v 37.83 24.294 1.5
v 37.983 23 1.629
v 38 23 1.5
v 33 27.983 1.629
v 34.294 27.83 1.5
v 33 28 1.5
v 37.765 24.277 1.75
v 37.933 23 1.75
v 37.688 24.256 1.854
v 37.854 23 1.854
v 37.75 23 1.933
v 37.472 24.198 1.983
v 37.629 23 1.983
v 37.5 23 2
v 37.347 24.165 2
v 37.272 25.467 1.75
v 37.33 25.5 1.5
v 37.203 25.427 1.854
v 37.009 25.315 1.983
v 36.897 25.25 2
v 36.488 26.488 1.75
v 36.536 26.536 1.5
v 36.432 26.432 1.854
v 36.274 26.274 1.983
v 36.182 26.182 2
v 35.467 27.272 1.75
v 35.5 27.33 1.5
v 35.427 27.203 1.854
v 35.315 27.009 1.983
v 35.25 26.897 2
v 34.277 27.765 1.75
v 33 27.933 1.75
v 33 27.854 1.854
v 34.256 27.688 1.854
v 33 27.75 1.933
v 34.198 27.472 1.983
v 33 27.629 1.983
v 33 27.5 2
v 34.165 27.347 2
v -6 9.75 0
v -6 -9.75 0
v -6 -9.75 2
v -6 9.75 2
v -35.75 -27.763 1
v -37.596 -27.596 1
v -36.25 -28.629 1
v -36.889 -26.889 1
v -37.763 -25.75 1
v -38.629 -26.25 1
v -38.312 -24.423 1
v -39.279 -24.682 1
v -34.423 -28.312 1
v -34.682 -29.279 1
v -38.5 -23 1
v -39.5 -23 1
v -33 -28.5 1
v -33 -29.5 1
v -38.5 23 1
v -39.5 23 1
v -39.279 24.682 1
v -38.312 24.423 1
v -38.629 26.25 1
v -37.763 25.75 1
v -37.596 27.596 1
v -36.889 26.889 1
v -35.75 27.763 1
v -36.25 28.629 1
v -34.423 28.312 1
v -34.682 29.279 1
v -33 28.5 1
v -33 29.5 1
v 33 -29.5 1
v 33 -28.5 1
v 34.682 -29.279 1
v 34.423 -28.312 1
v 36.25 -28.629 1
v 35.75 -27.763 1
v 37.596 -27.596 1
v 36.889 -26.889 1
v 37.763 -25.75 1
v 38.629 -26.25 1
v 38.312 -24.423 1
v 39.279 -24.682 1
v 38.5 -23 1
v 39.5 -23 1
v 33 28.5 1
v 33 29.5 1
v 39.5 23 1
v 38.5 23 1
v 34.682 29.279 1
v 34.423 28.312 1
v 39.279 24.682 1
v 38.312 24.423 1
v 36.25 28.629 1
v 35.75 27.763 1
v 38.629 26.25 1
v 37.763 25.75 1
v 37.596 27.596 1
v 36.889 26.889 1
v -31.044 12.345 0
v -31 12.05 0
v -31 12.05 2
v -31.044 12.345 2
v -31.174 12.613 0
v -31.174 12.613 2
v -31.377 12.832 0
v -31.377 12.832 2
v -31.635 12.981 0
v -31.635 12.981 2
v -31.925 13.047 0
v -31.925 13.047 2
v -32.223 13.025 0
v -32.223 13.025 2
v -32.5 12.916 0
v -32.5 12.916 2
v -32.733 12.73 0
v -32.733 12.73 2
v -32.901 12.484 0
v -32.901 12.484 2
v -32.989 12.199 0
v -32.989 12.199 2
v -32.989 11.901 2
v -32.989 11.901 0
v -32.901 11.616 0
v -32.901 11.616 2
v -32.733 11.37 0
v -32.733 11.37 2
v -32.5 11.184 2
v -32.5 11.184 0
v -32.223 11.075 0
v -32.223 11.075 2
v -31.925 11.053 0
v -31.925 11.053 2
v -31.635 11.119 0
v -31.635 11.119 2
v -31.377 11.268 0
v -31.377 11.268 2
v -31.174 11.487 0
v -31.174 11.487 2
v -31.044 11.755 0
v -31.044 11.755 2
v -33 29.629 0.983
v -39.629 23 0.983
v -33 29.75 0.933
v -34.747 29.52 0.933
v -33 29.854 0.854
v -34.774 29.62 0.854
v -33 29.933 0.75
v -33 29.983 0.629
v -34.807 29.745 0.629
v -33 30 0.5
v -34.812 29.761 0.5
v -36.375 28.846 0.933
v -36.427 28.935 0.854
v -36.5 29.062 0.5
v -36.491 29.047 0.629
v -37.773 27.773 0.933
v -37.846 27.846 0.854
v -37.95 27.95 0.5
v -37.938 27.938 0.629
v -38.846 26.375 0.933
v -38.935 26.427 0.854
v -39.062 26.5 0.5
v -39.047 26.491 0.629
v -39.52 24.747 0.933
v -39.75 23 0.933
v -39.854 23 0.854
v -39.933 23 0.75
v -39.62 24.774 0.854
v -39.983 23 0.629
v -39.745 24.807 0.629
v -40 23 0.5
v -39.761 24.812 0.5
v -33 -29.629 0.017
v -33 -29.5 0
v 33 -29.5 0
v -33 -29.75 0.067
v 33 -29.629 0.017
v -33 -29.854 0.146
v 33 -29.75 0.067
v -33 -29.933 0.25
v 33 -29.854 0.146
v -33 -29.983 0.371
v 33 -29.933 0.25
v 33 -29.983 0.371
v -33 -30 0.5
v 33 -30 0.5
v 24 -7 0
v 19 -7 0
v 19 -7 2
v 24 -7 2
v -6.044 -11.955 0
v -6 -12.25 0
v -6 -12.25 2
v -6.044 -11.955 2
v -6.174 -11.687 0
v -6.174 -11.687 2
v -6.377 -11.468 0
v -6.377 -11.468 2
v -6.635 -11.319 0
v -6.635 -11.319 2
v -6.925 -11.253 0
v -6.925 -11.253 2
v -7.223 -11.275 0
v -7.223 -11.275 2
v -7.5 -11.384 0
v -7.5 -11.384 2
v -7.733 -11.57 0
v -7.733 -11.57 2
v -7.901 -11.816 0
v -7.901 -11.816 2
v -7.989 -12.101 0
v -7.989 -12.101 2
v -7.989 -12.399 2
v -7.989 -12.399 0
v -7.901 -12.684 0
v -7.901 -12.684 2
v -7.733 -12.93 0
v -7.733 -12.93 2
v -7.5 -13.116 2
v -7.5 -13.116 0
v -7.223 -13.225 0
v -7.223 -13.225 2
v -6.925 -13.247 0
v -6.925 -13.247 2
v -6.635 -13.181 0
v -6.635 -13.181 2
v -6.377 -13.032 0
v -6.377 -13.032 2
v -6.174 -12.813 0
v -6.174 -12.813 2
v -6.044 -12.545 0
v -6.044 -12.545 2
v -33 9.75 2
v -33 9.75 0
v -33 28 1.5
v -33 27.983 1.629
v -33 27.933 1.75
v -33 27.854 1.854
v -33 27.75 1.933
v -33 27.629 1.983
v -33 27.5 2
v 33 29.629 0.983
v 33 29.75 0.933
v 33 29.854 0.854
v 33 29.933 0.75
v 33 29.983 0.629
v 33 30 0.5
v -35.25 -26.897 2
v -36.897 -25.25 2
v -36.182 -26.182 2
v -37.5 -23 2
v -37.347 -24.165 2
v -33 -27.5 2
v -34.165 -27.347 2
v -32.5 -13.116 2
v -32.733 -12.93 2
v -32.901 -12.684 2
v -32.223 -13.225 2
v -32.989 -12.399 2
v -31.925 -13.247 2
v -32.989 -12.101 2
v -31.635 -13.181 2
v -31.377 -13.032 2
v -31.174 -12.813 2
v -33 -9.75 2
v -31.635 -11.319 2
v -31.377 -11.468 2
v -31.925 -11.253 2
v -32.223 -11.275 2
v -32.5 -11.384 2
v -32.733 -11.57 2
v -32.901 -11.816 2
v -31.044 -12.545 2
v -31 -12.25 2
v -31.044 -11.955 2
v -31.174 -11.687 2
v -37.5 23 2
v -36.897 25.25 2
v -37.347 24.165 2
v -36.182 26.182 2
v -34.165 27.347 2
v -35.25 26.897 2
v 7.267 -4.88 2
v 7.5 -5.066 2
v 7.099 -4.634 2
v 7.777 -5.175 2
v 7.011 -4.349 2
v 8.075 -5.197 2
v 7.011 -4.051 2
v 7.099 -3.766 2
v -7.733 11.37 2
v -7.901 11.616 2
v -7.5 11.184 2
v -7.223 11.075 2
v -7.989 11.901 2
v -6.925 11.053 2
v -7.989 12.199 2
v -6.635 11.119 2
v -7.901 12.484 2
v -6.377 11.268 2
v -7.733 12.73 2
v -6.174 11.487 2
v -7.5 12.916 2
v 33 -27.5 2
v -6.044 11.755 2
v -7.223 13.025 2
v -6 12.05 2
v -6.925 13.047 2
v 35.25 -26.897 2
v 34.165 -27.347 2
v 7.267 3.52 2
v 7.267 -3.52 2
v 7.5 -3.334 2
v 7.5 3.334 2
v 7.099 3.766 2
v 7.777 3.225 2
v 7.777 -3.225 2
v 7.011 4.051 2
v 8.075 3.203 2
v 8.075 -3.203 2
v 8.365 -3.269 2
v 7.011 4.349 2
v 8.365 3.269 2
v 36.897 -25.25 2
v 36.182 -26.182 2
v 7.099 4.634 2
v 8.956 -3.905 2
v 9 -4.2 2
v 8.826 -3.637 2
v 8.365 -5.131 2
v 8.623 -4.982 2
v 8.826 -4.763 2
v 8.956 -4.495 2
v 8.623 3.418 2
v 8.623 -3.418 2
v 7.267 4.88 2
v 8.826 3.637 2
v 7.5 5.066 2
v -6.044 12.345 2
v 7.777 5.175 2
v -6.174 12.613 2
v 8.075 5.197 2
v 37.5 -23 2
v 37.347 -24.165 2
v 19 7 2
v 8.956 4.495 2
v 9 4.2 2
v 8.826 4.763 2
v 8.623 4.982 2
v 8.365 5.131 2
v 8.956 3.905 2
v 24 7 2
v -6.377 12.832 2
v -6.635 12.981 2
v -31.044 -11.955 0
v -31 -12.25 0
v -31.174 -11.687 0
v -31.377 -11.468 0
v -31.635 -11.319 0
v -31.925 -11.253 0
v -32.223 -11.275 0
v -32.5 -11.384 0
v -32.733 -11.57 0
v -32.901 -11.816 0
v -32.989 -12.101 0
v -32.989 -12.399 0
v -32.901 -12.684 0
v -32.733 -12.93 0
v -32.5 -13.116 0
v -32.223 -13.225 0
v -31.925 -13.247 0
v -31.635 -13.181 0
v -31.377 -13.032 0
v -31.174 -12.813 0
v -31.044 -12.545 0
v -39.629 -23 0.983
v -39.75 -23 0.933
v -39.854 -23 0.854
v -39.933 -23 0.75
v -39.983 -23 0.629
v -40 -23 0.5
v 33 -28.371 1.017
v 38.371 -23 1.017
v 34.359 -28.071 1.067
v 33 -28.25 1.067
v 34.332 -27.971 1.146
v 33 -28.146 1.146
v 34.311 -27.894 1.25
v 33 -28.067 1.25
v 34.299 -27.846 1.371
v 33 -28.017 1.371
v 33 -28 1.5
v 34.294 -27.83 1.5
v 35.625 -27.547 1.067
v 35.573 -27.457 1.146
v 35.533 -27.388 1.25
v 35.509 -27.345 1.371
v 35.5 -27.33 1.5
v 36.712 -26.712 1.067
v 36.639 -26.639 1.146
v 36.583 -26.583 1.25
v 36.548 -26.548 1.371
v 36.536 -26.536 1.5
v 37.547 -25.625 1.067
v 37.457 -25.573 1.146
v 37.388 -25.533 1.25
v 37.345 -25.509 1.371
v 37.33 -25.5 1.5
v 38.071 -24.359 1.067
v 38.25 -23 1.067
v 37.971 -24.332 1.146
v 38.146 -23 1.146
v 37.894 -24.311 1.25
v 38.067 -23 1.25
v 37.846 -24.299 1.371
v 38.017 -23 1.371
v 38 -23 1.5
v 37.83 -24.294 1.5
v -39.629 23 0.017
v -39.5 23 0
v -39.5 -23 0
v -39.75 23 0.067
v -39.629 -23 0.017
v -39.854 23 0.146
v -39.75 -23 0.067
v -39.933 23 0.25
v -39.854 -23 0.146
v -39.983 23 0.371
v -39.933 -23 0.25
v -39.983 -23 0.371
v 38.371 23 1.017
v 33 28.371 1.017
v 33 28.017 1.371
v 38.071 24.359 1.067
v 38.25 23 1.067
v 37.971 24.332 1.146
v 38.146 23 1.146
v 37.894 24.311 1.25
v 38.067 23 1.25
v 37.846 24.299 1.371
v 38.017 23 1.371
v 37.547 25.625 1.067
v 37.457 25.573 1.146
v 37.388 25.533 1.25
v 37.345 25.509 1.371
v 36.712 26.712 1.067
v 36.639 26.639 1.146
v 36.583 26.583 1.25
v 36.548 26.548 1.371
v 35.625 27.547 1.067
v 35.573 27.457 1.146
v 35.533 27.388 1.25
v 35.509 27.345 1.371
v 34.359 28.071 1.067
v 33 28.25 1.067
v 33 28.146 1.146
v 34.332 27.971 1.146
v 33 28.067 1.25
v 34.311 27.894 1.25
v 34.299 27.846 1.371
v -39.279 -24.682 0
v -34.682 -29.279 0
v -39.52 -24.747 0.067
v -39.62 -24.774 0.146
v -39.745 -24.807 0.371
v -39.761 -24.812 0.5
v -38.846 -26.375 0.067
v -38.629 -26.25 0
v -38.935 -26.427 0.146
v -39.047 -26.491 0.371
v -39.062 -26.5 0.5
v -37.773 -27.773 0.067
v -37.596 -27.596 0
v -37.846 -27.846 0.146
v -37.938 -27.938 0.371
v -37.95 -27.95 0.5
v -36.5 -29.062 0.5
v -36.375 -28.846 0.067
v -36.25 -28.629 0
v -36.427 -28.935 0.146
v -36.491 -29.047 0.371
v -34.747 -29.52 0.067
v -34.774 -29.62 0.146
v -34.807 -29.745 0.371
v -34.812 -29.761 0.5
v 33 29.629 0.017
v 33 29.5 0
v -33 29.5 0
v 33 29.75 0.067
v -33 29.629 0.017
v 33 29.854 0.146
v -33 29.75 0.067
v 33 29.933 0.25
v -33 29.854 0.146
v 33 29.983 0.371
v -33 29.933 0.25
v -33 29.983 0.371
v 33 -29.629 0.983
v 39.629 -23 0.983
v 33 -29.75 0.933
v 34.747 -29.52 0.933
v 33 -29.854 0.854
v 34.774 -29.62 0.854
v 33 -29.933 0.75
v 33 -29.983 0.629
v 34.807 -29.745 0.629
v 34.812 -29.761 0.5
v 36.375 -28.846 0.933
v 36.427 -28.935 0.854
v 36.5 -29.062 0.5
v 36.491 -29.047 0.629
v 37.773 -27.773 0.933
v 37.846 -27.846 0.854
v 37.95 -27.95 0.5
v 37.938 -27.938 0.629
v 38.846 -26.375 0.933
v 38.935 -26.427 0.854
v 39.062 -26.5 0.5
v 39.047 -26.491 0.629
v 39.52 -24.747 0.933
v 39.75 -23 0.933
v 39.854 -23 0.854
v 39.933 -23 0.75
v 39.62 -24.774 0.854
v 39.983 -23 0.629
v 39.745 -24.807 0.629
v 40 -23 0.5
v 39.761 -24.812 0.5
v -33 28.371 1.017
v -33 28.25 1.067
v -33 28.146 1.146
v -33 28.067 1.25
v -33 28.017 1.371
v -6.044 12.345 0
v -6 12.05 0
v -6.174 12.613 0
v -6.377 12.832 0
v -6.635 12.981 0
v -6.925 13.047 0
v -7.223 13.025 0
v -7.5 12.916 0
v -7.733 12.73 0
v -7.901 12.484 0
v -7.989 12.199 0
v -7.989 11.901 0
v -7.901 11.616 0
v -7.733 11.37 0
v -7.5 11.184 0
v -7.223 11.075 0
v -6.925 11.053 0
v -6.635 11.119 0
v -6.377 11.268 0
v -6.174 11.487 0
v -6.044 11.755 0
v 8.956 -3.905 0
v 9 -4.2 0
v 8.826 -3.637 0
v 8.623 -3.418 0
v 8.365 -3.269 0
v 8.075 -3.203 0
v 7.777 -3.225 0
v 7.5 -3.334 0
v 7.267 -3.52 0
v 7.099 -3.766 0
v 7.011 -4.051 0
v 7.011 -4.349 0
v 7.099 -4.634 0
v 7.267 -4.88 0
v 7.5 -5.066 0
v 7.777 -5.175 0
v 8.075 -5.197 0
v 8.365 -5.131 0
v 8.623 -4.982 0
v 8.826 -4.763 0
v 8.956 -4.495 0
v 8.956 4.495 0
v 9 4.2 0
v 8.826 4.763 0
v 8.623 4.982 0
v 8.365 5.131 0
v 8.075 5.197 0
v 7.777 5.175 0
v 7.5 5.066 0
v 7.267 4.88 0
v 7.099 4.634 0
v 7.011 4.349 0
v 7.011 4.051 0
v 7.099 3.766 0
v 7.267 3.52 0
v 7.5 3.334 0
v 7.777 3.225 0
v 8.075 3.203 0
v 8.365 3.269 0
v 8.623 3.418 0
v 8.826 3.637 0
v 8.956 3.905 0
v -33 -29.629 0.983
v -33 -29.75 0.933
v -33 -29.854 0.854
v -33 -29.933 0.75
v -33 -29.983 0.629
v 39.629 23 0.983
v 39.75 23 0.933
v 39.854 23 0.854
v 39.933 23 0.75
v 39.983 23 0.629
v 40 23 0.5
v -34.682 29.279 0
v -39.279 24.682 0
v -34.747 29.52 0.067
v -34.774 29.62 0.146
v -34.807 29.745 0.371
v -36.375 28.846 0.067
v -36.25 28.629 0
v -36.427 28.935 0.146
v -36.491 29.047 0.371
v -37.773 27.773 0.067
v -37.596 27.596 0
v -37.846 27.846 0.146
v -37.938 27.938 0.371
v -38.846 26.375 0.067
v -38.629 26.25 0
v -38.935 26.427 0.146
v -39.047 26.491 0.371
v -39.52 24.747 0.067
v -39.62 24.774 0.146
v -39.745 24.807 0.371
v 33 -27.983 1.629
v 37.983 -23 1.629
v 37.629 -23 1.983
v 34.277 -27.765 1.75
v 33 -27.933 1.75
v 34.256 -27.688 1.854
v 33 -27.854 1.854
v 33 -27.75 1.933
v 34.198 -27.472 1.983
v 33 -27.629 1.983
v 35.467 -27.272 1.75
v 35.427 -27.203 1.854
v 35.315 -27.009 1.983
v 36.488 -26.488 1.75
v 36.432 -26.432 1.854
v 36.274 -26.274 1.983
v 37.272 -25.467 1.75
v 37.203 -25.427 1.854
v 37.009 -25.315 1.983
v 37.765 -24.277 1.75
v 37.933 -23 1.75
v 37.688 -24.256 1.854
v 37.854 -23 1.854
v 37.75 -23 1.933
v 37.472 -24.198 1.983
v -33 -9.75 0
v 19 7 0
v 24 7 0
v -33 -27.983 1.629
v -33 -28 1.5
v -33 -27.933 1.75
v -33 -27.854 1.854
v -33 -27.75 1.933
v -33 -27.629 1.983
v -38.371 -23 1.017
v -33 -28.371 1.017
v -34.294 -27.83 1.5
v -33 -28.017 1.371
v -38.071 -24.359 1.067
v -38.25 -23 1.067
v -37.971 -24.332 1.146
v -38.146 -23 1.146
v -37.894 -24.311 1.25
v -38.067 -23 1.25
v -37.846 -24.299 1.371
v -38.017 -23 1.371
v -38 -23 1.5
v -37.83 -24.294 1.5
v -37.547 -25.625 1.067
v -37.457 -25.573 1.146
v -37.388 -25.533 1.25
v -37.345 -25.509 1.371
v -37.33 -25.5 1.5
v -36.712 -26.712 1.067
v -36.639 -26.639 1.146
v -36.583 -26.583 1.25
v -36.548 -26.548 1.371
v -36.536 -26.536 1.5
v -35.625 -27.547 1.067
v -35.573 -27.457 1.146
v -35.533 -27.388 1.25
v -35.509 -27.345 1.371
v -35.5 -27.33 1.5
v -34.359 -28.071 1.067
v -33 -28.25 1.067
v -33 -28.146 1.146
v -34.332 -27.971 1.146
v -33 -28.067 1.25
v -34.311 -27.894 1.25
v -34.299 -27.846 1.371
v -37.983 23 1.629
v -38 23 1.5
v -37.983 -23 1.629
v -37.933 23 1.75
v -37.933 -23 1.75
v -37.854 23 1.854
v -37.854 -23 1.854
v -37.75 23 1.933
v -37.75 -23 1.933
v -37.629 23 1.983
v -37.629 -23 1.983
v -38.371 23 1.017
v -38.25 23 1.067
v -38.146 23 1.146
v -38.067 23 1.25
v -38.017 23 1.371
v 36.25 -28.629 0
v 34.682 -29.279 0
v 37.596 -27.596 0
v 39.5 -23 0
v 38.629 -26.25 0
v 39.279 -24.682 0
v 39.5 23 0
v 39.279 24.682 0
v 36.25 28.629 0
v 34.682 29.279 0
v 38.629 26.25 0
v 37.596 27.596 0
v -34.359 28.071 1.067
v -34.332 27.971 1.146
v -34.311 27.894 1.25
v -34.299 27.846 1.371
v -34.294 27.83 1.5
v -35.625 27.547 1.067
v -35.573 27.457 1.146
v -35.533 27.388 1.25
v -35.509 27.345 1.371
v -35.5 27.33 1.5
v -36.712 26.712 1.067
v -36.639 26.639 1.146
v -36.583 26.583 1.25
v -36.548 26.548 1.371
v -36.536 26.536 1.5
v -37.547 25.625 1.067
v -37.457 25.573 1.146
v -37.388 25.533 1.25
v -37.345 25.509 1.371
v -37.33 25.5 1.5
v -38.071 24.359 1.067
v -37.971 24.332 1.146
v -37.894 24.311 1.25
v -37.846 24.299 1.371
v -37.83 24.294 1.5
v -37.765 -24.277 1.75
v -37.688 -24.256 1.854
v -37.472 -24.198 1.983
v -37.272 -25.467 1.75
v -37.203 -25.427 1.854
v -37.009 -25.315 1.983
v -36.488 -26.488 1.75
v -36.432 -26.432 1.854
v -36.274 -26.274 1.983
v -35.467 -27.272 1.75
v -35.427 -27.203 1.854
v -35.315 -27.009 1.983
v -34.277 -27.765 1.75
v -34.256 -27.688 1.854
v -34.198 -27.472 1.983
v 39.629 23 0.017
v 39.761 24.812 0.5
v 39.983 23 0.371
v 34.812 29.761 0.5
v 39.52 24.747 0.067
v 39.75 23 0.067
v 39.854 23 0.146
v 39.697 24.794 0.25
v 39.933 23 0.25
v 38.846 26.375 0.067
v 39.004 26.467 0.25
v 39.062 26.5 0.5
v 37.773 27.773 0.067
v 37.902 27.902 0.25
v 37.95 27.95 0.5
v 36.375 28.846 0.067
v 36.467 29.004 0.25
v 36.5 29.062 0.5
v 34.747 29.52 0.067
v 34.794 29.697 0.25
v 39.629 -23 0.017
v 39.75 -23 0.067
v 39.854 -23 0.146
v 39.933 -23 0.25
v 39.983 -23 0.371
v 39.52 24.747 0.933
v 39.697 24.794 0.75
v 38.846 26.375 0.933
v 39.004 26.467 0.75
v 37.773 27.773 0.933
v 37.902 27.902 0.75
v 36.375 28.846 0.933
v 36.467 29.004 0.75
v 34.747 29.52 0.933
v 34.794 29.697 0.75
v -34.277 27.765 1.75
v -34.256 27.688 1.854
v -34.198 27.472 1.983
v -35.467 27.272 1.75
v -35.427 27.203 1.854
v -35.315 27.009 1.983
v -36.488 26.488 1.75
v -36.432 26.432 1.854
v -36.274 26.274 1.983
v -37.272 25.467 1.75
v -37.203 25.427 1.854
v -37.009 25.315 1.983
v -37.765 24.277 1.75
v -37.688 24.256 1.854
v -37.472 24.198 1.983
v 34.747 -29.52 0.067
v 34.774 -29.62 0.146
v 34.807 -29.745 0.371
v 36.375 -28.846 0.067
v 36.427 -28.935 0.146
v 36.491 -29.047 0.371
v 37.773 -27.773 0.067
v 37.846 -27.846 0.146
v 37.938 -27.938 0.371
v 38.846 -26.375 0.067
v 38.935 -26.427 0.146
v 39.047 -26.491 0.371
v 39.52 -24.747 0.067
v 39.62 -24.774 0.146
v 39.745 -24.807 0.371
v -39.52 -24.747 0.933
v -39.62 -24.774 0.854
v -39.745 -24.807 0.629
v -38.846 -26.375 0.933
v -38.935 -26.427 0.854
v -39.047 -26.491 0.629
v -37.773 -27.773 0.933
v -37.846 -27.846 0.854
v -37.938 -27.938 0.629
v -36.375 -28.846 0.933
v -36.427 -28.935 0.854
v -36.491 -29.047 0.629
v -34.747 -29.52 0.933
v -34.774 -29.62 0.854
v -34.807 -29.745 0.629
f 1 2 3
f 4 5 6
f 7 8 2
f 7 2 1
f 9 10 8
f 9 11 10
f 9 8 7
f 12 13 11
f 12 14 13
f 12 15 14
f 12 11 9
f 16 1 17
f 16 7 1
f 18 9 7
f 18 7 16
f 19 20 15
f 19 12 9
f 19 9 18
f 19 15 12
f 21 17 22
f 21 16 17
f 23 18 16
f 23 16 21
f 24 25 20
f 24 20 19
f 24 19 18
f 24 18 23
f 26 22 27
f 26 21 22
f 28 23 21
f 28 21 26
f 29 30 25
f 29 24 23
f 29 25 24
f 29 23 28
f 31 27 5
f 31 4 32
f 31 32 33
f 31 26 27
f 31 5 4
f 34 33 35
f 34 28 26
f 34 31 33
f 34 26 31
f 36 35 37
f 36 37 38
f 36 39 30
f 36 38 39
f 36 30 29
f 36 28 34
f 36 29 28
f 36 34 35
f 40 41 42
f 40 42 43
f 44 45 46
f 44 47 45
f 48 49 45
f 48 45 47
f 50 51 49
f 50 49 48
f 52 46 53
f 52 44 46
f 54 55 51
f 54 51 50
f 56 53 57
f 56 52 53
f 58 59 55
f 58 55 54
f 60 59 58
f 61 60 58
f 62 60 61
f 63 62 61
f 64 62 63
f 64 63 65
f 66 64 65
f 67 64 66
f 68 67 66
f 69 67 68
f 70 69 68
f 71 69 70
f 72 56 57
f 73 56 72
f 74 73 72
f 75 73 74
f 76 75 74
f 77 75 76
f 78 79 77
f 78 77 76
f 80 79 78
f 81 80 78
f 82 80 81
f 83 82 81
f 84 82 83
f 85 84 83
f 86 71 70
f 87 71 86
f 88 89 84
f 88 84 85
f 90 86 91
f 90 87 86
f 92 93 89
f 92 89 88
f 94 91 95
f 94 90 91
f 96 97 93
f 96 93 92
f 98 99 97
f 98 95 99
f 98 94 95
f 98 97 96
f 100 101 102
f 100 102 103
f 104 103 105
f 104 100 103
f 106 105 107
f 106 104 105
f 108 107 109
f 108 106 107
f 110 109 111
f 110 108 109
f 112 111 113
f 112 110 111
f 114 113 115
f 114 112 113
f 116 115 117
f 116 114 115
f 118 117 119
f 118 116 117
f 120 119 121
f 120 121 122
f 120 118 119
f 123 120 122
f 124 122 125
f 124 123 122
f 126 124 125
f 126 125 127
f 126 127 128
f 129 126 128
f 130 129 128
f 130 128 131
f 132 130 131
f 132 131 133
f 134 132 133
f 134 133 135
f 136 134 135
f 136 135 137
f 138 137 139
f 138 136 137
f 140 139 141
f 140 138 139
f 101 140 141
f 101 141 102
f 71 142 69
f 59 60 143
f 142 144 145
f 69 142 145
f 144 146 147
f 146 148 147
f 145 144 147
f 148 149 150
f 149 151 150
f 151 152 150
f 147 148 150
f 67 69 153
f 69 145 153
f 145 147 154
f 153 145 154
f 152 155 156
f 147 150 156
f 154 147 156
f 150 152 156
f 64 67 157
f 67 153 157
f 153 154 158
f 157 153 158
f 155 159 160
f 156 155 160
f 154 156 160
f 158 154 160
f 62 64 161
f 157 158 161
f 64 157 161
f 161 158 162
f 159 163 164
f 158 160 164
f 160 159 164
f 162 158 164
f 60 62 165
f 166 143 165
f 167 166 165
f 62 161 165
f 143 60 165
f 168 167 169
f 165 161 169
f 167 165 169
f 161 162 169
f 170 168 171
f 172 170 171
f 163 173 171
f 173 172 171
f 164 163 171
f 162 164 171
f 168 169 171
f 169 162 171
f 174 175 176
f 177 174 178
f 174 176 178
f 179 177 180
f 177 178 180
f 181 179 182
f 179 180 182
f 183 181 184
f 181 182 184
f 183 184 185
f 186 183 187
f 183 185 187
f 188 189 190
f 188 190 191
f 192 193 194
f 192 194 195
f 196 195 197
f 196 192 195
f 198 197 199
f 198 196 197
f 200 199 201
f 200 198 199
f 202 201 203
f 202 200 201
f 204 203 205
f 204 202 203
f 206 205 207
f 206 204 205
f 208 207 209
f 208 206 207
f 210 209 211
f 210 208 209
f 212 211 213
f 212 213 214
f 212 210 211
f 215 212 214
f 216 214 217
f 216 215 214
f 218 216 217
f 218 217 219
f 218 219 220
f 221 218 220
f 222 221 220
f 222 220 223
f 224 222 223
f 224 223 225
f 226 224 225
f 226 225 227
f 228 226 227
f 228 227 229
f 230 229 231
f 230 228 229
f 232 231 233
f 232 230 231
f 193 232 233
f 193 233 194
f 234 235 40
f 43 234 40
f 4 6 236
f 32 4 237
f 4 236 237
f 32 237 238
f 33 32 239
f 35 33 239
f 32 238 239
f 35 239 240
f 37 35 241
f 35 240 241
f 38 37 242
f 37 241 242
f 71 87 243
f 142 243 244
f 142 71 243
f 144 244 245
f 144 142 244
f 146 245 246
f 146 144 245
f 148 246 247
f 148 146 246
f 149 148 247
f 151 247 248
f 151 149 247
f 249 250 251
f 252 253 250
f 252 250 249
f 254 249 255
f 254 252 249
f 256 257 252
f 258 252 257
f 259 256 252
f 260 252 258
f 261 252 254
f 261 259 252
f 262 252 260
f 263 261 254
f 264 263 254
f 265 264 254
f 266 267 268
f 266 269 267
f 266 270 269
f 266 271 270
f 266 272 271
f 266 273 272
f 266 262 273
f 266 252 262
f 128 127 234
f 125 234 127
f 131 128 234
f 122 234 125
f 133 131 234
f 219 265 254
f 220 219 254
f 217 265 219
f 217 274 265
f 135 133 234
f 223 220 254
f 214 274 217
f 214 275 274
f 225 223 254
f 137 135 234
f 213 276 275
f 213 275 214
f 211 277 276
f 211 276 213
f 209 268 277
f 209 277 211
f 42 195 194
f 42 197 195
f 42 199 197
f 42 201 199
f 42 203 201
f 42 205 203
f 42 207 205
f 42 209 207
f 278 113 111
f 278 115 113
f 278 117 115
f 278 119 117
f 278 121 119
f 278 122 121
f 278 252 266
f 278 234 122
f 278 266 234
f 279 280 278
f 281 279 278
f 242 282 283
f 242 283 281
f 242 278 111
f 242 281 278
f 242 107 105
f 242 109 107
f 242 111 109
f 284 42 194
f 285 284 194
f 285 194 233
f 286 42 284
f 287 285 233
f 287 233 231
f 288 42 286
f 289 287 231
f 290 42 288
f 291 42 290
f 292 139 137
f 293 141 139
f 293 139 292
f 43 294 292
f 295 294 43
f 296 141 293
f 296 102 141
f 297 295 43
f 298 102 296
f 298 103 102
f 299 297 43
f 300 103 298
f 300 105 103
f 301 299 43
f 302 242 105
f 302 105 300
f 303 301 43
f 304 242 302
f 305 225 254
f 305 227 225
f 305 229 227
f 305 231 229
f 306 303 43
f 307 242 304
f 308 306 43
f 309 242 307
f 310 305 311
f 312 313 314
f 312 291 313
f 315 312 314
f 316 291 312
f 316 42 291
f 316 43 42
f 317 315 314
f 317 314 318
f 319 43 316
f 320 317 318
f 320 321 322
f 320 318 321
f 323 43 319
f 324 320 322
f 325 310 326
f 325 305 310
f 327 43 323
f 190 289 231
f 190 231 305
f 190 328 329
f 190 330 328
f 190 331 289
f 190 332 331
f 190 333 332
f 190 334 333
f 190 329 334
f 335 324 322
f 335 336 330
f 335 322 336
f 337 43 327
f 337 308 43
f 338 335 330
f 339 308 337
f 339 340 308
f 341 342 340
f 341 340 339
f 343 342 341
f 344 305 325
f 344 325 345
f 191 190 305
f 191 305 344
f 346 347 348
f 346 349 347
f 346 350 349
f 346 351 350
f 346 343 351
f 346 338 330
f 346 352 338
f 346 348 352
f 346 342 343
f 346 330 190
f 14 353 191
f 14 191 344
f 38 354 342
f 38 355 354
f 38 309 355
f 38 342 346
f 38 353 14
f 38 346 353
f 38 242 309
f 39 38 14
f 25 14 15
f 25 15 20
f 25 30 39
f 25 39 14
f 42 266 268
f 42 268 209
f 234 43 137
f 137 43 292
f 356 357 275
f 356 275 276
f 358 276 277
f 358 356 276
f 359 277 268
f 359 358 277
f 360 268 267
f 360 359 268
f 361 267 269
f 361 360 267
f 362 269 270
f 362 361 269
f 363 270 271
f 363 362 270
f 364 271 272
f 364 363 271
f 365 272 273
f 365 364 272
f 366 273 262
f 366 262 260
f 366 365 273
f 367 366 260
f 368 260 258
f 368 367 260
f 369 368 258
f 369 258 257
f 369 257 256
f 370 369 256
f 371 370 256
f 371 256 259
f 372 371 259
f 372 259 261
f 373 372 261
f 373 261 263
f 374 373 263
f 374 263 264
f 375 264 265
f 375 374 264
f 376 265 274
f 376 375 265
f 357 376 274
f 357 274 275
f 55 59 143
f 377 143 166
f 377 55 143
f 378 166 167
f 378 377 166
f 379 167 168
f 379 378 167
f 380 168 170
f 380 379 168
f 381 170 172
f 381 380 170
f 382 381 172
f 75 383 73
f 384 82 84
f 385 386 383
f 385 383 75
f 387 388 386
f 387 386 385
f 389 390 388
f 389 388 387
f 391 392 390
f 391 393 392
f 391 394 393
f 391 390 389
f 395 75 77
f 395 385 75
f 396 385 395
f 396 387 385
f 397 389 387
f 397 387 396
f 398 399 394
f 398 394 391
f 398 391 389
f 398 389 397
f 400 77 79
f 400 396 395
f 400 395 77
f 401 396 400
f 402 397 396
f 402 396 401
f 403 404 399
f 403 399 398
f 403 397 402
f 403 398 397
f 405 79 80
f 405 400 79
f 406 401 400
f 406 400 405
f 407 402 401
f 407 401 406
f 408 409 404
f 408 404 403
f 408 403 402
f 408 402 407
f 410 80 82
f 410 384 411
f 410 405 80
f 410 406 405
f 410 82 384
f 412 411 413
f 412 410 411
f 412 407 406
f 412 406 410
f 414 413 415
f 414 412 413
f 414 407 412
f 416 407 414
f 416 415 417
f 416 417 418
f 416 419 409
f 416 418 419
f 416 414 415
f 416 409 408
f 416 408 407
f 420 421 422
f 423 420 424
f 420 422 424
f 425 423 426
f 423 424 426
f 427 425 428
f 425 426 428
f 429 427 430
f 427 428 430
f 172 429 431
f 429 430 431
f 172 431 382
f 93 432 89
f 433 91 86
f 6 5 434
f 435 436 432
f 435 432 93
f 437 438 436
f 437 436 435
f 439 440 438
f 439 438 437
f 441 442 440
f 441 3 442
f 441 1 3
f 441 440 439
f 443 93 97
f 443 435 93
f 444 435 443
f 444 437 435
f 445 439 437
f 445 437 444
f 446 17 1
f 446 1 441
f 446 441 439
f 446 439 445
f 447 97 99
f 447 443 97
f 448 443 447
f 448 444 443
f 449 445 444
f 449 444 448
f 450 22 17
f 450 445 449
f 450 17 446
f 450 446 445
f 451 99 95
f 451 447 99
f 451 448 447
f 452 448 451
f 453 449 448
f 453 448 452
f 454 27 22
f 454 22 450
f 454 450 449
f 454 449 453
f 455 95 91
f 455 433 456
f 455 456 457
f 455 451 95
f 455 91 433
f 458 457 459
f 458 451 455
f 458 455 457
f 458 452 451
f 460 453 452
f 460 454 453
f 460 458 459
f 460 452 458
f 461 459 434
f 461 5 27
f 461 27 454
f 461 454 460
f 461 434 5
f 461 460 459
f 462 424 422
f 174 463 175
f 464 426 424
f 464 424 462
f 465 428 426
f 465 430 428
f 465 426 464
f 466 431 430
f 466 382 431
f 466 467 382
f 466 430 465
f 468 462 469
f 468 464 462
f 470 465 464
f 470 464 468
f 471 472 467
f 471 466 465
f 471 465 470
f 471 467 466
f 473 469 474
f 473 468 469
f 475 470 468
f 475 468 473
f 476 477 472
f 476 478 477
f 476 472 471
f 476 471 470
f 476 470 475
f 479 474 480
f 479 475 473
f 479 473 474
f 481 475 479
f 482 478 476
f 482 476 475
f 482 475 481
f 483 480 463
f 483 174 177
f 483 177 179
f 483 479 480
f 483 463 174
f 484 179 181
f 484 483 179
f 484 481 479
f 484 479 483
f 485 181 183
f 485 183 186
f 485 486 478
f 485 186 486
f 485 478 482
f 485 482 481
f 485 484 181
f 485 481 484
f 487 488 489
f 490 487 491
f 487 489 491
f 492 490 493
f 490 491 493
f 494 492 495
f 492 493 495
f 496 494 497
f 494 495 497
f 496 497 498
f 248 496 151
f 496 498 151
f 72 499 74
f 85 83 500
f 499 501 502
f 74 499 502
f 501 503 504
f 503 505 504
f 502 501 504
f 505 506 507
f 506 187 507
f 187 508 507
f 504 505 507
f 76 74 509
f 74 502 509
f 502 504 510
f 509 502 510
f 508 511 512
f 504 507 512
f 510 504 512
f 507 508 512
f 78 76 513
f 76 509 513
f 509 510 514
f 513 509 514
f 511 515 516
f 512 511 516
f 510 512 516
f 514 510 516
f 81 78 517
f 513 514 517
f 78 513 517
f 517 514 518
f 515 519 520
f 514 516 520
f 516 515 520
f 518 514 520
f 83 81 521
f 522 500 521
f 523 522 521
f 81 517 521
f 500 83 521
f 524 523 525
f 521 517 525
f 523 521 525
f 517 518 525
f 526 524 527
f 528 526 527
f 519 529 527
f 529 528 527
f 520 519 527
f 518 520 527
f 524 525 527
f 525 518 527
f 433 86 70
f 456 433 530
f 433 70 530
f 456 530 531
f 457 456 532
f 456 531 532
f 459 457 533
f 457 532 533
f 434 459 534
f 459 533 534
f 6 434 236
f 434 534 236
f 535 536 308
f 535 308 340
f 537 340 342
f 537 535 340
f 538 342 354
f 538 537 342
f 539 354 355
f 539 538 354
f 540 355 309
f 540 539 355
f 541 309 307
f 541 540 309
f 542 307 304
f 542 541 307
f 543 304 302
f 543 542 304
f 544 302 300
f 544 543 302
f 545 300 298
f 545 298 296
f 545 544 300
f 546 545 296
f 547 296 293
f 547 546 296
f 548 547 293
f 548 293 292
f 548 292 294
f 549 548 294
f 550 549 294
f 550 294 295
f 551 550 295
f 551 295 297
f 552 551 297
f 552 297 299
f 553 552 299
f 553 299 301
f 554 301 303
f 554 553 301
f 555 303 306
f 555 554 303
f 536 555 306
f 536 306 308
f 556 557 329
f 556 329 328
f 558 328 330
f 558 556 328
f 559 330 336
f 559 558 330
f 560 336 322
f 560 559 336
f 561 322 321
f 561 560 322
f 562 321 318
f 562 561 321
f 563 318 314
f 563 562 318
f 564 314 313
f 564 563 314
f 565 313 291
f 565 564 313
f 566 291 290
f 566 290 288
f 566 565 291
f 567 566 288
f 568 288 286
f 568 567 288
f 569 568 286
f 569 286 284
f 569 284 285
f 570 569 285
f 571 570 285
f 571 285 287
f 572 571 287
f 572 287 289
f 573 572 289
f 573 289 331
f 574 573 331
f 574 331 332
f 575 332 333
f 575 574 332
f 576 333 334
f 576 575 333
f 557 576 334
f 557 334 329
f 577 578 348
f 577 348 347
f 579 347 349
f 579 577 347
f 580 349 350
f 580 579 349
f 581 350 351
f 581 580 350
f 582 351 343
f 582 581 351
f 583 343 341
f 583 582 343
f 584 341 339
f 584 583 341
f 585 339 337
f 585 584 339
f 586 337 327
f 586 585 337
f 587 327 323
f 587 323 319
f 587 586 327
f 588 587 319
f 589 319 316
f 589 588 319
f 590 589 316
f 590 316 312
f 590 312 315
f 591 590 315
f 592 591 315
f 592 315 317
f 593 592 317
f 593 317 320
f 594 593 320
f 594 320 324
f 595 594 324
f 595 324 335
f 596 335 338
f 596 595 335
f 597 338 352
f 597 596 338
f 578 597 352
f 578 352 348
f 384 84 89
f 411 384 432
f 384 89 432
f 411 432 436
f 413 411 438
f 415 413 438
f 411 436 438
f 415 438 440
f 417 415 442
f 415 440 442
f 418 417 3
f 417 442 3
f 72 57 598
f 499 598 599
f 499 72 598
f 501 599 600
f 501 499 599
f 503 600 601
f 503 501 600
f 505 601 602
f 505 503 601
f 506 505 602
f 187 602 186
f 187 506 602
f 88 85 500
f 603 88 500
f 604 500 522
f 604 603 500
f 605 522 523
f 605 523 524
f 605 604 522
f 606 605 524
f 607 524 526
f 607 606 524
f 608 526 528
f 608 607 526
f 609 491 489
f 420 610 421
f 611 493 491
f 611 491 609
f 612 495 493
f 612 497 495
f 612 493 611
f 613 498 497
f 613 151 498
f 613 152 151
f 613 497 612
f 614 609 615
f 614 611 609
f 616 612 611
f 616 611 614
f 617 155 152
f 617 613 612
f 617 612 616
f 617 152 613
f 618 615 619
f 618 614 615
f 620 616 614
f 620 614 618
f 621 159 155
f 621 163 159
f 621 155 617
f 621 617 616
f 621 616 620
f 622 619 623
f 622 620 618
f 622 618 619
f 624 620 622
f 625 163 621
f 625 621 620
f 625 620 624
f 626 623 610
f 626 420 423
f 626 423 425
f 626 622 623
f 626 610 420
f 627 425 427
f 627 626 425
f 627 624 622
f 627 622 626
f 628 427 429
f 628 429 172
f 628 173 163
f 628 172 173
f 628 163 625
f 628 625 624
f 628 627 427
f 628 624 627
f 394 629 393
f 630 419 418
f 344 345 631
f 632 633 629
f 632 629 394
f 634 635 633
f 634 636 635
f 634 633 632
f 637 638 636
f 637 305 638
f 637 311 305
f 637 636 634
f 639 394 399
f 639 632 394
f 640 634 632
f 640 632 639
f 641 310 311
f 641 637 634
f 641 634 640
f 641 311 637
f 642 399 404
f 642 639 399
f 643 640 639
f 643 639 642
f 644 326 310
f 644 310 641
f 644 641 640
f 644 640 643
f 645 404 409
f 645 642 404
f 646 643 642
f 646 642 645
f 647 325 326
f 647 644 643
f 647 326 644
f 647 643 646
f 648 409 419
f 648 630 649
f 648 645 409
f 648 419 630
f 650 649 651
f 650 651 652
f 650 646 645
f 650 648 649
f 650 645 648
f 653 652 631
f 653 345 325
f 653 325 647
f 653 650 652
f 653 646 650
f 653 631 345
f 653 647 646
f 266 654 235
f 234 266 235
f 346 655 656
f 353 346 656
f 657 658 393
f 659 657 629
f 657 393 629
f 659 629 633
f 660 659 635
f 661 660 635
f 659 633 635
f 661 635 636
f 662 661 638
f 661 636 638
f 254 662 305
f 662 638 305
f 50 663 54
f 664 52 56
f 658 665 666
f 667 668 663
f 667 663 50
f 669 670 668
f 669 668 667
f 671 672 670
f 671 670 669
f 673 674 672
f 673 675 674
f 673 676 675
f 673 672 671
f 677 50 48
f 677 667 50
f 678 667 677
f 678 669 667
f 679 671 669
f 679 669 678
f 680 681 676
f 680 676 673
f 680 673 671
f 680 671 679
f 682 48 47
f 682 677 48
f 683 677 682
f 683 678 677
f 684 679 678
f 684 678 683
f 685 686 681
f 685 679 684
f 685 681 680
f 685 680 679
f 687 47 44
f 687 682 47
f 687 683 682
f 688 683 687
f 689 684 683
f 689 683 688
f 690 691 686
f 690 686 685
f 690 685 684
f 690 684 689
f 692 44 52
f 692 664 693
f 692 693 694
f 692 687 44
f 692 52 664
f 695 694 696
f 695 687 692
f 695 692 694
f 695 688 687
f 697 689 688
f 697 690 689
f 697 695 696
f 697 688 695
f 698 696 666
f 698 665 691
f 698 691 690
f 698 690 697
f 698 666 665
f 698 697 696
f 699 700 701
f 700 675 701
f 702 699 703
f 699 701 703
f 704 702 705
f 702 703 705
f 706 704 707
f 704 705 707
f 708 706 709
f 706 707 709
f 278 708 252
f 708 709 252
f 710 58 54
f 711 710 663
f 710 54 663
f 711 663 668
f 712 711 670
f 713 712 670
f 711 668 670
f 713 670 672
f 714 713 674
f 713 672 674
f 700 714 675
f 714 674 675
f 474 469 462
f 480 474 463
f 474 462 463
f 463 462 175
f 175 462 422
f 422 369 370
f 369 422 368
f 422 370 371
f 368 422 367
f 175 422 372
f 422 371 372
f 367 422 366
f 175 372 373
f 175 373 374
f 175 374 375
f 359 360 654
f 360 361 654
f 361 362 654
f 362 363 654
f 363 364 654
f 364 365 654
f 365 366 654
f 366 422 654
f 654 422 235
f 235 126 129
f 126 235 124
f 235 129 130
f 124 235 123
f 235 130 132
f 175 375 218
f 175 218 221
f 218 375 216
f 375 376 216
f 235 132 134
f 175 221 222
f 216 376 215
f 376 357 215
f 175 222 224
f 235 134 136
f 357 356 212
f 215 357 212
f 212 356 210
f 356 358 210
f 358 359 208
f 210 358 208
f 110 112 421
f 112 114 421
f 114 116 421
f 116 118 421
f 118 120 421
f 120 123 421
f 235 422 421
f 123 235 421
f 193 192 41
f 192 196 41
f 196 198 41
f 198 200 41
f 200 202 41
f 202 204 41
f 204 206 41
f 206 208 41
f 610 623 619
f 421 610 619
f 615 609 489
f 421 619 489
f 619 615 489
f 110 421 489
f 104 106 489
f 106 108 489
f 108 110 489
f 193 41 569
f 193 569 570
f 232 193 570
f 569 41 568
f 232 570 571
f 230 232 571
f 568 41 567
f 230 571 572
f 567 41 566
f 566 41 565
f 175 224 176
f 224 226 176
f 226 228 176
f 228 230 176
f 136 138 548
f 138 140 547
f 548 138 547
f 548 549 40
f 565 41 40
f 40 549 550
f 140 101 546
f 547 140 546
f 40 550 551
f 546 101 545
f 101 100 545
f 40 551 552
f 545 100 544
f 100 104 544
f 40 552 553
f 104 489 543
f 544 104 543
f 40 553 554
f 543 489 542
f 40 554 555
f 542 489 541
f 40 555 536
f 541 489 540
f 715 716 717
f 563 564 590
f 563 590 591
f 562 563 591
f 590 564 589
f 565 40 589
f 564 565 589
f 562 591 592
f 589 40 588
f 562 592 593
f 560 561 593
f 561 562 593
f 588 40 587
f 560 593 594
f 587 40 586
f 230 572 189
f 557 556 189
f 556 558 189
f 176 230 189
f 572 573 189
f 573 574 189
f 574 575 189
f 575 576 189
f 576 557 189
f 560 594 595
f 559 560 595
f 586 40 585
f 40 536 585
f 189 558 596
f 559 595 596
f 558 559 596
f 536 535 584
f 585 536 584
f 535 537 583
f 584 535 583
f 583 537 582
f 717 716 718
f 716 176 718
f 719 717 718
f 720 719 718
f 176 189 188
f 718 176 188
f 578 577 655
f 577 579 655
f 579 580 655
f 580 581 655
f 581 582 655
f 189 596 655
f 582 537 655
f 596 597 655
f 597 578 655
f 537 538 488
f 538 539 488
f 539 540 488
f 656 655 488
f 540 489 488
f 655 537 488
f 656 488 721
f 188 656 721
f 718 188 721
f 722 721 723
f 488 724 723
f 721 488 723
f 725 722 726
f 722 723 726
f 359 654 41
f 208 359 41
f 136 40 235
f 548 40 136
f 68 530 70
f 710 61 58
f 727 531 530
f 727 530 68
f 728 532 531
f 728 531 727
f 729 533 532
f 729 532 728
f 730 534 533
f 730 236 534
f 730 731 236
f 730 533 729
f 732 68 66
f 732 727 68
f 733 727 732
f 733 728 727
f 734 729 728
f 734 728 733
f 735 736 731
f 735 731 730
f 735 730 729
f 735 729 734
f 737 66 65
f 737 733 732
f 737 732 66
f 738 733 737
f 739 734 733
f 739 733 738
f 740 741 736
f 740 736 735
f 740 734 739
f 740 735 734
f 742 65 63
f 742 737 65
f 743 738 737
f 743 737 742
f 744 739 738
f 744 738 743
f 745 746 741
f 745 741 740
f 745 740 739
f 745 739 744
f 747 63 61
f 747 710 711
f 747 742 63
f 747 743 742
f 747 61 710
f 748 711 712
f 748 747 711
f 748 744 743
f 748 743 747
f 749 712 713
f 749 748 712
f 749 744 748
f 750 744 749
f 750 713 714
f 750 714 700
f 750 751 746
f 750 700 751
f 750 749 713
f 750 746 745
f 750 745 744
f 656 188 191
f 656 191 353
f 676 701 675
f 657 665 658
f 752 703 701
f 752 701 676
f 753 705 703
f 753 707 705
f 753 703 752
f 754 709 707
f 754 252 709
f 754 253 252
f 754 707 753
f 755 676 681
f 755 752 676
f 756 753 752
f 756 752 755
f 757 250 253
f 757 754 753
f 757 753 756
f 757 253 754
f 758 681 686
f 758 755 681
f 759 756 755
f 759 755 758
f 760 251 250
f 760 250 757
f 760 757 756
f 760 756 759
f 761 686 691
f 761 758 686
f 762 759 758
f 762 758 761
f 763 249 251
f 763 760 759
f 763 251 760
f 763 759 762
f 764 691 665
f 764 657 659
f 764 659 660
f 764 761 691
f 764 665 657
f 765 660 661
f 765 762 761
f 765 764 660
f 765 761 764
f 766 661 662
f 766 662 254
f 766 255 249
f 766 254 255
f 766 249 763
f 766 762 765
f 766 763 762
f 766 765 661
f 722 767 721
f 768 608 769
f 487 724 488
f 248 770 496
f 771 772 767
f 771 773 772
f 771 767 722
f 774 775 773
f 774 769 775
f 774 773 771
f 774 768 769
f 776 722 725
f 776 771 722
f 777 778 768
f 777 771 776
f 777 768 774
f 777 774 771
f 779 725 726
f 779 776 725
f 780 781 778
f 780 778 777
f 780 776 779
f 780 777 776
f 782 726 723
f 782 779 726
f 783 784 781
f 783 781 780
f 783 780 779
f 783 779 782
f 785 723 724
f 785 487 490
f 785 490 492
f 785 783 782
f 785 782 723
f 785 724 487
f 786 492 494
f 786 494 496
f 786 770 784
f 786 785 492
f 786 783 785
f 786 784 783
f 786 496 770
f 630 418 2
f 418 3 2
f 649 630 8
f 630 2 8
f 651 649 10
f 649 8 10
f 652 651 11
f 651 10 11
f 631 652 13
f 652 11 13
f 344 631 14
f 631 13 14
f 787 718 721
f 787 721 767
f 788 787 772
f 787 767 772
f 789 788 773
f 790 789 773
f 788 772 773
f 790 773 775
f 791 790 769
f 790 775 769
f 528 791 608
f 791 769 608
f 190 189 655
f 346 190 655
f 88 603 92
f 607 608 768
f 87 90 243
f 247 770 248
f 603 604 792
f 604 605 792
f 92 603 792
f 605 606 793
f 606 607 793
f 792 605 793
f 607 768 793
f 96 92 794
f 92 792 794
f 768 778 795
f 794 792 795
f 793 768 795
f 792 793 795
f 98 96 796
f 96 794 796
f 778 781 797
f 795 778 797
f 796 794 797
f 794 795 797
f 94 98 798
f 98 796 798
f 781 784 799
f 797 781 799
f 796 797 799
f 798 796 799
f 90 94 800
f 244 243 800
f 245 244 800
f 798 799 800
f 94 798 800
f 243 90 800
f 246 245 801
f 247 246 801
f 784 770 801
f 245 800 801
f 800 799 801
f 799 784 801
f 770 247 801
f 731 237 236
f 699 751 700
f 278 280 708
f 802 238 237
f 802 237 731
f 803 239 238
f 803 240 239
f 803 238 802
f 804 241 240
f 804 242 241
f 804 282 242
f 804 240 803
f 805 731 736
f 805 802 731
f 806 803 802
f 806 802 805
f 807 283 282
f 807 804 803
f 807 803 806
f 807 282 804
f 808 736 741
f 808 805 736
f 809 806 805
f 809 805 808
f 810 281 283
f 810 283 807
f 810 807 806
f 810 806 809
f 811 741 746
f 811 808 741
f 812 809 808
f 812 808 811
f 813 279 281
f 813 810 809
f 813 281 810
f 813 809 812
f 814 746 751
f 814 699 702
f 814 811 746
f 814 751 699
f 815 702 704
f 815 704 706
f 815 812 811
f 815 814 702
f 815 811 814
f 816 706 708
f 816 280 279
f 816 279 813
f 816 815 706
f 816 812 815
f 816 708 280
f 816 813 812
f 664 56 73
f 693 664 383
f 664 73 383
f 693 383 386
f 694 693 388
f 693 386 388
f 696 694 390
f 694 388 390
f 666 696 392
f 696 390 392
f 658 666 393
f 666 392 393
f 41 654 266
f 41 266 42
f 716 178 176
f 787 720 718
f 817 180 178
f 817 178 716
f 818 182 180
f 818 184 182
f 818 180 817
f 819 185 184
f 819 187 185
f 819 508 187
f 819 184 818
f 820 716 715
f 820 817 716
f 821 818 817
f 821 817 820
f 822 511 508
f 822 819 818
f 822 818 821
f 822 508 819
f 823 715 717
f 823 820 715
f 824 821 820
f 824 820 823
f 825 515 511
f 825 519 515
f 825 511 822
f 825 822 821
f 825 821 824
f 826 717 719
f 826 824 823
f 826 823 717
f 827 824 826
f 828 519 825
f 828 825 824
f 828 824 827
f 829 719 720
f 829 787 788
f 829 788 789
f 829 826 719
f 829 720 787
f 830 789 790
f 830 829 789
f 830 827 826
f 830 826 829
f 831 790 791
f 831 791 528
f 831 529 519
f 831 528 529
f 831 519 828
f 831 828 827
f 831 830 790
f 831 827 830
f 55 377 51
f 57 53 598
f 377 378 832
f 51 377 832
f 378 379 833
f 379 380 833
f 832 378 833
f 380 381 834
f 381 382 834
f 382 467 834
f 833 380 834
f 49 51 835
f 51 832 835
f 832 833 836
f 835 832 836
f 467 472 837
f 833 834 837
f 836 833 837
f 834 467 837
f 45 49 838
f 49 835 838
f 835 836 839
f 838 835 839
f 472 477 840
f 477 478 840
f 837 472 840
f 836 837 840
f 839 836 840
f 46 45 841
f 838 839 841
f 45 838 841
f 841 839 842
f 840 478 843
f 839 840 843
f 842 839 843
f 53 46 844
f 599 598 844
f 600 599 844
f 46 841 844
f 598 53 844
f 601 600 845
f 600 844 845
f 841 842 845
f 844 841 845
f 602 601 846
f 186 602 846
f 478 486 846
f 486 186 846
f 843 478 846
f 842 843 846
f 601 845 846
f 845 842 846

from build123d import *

# Parameters (mm, degrees)
ESQUISSE1_R             = 1
ESQUISSE1_W             = 27
ESQUISSE1_H             = 19.5
ESQUISSE1_W_2           = 5
ESQUISSE1_H_2           = 14
BOSS_EXTRU_1_DEPTH      = 2
ENL_V_START             = -1
ENL_V_MAT_EXTRU_1_DEPTH = 1
CONG_1_R                = 0.5


with BuildPart() as part:
    # Esquisse1 → Boss.-Extru.1 (new body)
    with BuildSketch(Plane.XY):
        with BuildLine():
            Line((33, 30), (-33, 30))
            ThreePointArc((-33, 30), (-37.949747468, 27.949747468), (-40, 23))
            Line((-40, 23), (-40, -23))
            ThreePointArc((-40, -23), (-37.949747468, -27.949747468), (-33, -30))
            Line((-33, -30), (33, -30))
            ThreePointArc((33, -30), (37.949747468, -27.949747468), (40, -23))
            Line((40, -23), (40, 23))
            ThreePointArc((40, 23), (37.949747468, 27.949747468), (33, 30))
        make_face()
        with Locations((-32, 12.05)):
            Circle(ESQUISSE1_R, mode=Mode.SUBTRACT)
        with Locations((-7, 12.05)):
            Circle(ESQUISSE1_R, mode=Mode.SUBTRACT)
        with Locations((-7, -12.25)):
            Circle(ESQUISSE1_R, mode=Mode.SUBTRACT)
        with Locations((-32, -12.25)):
            Circle(ESQUISSE1_R, mode=Mode.SUBTRACT)
        with Locations((8, 4.2)):
            Circle(ESQUISSE1_R, mode=Mode.SUBTRACT)
        with Locations((8, -4.2)):
            Circle(ESQUISSE1_R, mode=Mode.SUBTRACT)
        with Locations((-19.5, 0)):
            Rectangle(ESQUISSE1_W, ESQUISSE1_H, mode=Mode.SUBTRACT)
        with Locations((21.5, 0)):
            Rectangle(ESQUISSE1_W_2, ESQUISSE1_H_2, mode=Mode.SUBTRACT)
    extrude(amount=BOSS_EXTRU_1_DEPTH)

    # Esquisse2 → Enlèv. mat.-Extru.1 (cut)
    with BuildSketch(Plane.XY.offset(2).offset(ENL_V_START)):
        with BuildLine():
            Line((40, -23), (40, 23))
            ThreePointArc((40, 23), (37.949747468, 27.949747468), (33, 30))
            Line((33, 30), (-33, 30))
            ThreePointArc((-33, 30), (-37.949747468, 27.949747468), (-40, 23))
            Line((-40, 23), (-40, -23))
            ThreePointArc((-40, -23), (-37.949747468, -27.949747468), (-33, -30))
            Line((-33, -30), (33, -30))
            ThreePointArc((33, -30), (37.949747468, -27.949747468), (40, -23))
        make_face()
        with BuildLine():
            Line((38, -23), (38, 23))
            ThreePointArc((38, 23), (36.535533906, 26.535533906), (33, 28))
            Line((33, 28), (-33, 28))
            ThreePointArc((-33, 28), (-36.535533906, 26.535533906), (-38, 23))
            Line((-38, 23), (-38, -23))
            ThreePointArc((-38, -23), (-36.535533906, -26.535533906), (-33, -28))
            Line((-33, -28), (33, -28))
            ThreePointArc((33, -28), (36.535533906, -26.535533906), (38, -23))
        make_face(mode=Mode.SUBTRACT)
    extrude(amount=ENL_V_MAT_EXTRU_1_DEPTH, mode=Mode.SUBTRACT)

    # Congé1
    cong_1_edges = [part.edges().sort_by_distance(p)[0] for p in [
        (37.949747468, 27.949747468, 0),
        (40, 0, 0),
        (37.949747468, -27.949747468, 0),
        (0, -30, 0),
        (-37.949747468, -27.949747468, 0),
        (-40, 0, 0),
        (-37.949747468, 27.949747468, 0),
        (37.949747468, 27.949747468, 1),
        (40, 0, 1),
        (37.949747468, -27.949747468, 1),
        (0, -30, 1),
        (-37.949747468, -27.949747468, 1),
        (-40, 0, 1),
        (-37.949747468, 27.949747468, 1),
        (36.535533906, 26.535533906, 2),
        (38, 0, 2),
        (36.535533906, -26.535533906, 2),
        (0, -28, 2),
        (-36.535533906, -26.535533906, 2),
        (-38, 0, 2),
        (-36.535533906, 26.535533906, 2),
        (36.535533906, 26.535533906, 1),
        (38, 0, 1),
        (36.535533906, -26.535533906, 1),
        (0, -28, 1),
        (-36.535533906, -26.535533906, 1),
        (-38, 0, 1),
        (-36.535533906, 26.535533906, 1),
        (0, 30, 0),
        (0, 30, 1),
        (0, 28, 2),
        (0, 28, 1),
    ]]
    fillet(cong_1_edges, radius=CONG_1_R - 0.0001)  # a hair under: the kernel refuses the full size


solid = part.part
